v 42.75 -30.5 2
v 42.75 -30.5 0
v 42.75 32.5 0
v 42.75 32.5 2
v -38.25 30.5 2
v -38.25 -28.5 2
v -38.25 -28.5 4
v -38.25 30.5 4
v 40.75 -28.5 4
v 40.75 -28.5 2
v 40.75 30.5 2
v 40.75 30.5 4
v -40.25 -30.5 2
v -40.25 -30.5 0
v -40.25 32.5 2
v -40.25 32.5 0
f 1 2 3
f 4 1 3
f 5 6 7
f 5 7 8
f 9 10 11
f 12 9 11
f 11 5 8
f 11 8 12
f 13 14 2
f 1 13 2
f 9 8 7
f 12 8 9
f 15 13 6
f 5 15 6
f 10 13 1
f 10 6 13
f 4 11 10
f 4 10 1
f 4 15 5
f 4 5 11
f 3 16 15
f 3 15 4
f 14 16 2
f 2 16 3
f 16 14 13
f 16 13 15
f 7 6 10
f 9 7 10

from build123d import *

# Parameters (mm, degrees)
F0_W     = 79
F0_H     = 59
F0_W_2   = 75
F0_H_2   = 55
F1_DEPTH = 4
F0_W_3   = 83
F0_H_3   = 63
F2_DEPTH = 2


with BuildPart() as f1:
    # F0 (on Top) → F1 (new body)
    with BuildSketch(Plane.XY):
        with Locations((1.25, 1)):
            Rectangle(F0_W, F0_H)
        with Locations((1.25, 1)):
            Rectangle(F0_W_2, F0_H_2, mode=Mode.SUBTRACT)
        with Locations((1.25, 1)):
            Rectangle(F0_W_2, F0_H_2)
    extrude(amount=F1_DEPTH)

    # F0 (on Top) → F2 (join)
    with BuildSketch(Plane.XY):
        with Locations((1.25, 1)):
            Rectangle(F0_W_3, F0_H_3)
        with Locations((1.25, 1)):
            Rectangle(F0_W, F0_H, mode=Mode.SUBTRACT)
    extrude(amount=F2_DEPTH)


solid = f1.part
